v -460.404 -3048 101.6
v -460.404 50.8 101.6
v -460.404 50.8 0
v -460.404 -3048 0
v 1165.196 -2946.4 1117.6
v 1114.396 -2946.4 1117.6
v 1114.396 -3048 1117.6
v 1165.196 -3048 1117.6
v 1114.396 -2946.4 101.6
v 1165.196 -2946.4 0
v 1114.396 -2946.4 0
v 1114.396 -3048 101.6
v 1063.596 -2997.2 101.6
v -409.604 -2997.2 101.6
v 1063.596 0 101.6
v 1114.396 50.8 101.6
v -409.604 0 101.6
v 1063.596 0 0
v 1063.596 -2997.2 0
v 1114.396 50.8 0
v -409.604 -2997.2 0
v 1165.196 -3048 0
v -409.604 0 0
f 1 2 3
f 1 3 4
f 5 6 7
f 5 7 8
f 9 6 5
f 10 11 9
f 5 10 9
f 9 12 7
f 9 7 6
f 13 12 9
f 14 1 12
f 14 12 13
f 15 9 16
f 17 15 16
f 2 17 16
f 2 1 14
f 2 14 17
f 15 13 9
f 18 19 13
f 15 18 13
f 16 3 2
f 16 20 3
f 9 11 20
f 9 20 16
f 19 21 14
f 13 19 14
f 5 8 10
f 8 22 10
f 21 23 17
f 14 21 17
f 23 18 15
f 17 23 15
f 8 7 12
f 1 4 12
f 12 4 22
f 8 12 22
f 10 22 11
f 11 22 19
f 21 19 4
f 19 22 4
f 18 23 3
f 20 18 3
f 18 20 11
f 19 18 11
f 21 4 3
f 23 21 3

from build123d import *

# Parameters (mm, degrees)
F0_W      = 50.8
F0_H      = 101.6
F1_DEPTH  = 3048
F2_W      = 50.8
F2_H      = 101.6
F3_DEPTH  = 1524
F4_W      = 50.8
F4_H      = 101.6
F5_DEPTH  = 3048
F6_W      = 50.8
F6_H      = 101.6
F7_DEPTH  = 1524
F8_W      = 101.6
F8_H      = 101.6
F9_DEPTH  = 50.8
F10_W     = 50.8
F10_H     = 101.6
F11_DEPTH = 1016


with BuildPart() as f1:
    # F0 (on Front) → F1 (new body)
    with BuildSketch(Plane.XZ):
        with Locations((-435.003594, 50.8)):
            Rectangle(F0_W, F0_H)
    extrude(amount=F1_DEPTH)

    # F2 (on face) → F3 (join)
    with BuildSketch(Plane.YZ.offset(-409.603594)):
        with Locations((-3022.6, 50.8)):
            Rectangle(F2_W, F2_H)
    extrude(amount=F3_DEPTH)

    # F4 (on face) → F5 (join)
    with BuildSketch(Plane(origin=(0, -2997.2, 0), x_dir=(-1, 0, 0), z_dir=(0, 1, 0))):
        with Locations((-1088.996406, 50.8)):
            Rectangle(F4_W, F4_H)
    extrude(amount=F5_DEPTH)

    # F6 (on face) → F7 (join)
    with BuildSketch(Plane(origin=(1063.596406, 0, 0), x_dir=(0, -1, 0), z_dir=(-1, 0, 0))):
        with Locations((-25.4, 50.8)):
            Rectangle(F6_W, F6_H)
    extrude(amount=F7_DEPTH)

    # F8 (on face) → F9 (join)
    with BuildSketch(Plane.YZ.offset(1114.396406)):
        with Locations((-2997.2, 50.8)):
            Rectangle(F8_W, F8_H)
    extrude(amount=F9_DEPTH)

    # F10 (on face) → F11 (join)
    with BuildSketch(Plane.XY.offset(101.6)):
        with Locations((1139.796406, -2997.2)):
            Rectangle(F10_W, F10_H)
    extrude(amount=F11_DEPTH)


solid = f1.part
